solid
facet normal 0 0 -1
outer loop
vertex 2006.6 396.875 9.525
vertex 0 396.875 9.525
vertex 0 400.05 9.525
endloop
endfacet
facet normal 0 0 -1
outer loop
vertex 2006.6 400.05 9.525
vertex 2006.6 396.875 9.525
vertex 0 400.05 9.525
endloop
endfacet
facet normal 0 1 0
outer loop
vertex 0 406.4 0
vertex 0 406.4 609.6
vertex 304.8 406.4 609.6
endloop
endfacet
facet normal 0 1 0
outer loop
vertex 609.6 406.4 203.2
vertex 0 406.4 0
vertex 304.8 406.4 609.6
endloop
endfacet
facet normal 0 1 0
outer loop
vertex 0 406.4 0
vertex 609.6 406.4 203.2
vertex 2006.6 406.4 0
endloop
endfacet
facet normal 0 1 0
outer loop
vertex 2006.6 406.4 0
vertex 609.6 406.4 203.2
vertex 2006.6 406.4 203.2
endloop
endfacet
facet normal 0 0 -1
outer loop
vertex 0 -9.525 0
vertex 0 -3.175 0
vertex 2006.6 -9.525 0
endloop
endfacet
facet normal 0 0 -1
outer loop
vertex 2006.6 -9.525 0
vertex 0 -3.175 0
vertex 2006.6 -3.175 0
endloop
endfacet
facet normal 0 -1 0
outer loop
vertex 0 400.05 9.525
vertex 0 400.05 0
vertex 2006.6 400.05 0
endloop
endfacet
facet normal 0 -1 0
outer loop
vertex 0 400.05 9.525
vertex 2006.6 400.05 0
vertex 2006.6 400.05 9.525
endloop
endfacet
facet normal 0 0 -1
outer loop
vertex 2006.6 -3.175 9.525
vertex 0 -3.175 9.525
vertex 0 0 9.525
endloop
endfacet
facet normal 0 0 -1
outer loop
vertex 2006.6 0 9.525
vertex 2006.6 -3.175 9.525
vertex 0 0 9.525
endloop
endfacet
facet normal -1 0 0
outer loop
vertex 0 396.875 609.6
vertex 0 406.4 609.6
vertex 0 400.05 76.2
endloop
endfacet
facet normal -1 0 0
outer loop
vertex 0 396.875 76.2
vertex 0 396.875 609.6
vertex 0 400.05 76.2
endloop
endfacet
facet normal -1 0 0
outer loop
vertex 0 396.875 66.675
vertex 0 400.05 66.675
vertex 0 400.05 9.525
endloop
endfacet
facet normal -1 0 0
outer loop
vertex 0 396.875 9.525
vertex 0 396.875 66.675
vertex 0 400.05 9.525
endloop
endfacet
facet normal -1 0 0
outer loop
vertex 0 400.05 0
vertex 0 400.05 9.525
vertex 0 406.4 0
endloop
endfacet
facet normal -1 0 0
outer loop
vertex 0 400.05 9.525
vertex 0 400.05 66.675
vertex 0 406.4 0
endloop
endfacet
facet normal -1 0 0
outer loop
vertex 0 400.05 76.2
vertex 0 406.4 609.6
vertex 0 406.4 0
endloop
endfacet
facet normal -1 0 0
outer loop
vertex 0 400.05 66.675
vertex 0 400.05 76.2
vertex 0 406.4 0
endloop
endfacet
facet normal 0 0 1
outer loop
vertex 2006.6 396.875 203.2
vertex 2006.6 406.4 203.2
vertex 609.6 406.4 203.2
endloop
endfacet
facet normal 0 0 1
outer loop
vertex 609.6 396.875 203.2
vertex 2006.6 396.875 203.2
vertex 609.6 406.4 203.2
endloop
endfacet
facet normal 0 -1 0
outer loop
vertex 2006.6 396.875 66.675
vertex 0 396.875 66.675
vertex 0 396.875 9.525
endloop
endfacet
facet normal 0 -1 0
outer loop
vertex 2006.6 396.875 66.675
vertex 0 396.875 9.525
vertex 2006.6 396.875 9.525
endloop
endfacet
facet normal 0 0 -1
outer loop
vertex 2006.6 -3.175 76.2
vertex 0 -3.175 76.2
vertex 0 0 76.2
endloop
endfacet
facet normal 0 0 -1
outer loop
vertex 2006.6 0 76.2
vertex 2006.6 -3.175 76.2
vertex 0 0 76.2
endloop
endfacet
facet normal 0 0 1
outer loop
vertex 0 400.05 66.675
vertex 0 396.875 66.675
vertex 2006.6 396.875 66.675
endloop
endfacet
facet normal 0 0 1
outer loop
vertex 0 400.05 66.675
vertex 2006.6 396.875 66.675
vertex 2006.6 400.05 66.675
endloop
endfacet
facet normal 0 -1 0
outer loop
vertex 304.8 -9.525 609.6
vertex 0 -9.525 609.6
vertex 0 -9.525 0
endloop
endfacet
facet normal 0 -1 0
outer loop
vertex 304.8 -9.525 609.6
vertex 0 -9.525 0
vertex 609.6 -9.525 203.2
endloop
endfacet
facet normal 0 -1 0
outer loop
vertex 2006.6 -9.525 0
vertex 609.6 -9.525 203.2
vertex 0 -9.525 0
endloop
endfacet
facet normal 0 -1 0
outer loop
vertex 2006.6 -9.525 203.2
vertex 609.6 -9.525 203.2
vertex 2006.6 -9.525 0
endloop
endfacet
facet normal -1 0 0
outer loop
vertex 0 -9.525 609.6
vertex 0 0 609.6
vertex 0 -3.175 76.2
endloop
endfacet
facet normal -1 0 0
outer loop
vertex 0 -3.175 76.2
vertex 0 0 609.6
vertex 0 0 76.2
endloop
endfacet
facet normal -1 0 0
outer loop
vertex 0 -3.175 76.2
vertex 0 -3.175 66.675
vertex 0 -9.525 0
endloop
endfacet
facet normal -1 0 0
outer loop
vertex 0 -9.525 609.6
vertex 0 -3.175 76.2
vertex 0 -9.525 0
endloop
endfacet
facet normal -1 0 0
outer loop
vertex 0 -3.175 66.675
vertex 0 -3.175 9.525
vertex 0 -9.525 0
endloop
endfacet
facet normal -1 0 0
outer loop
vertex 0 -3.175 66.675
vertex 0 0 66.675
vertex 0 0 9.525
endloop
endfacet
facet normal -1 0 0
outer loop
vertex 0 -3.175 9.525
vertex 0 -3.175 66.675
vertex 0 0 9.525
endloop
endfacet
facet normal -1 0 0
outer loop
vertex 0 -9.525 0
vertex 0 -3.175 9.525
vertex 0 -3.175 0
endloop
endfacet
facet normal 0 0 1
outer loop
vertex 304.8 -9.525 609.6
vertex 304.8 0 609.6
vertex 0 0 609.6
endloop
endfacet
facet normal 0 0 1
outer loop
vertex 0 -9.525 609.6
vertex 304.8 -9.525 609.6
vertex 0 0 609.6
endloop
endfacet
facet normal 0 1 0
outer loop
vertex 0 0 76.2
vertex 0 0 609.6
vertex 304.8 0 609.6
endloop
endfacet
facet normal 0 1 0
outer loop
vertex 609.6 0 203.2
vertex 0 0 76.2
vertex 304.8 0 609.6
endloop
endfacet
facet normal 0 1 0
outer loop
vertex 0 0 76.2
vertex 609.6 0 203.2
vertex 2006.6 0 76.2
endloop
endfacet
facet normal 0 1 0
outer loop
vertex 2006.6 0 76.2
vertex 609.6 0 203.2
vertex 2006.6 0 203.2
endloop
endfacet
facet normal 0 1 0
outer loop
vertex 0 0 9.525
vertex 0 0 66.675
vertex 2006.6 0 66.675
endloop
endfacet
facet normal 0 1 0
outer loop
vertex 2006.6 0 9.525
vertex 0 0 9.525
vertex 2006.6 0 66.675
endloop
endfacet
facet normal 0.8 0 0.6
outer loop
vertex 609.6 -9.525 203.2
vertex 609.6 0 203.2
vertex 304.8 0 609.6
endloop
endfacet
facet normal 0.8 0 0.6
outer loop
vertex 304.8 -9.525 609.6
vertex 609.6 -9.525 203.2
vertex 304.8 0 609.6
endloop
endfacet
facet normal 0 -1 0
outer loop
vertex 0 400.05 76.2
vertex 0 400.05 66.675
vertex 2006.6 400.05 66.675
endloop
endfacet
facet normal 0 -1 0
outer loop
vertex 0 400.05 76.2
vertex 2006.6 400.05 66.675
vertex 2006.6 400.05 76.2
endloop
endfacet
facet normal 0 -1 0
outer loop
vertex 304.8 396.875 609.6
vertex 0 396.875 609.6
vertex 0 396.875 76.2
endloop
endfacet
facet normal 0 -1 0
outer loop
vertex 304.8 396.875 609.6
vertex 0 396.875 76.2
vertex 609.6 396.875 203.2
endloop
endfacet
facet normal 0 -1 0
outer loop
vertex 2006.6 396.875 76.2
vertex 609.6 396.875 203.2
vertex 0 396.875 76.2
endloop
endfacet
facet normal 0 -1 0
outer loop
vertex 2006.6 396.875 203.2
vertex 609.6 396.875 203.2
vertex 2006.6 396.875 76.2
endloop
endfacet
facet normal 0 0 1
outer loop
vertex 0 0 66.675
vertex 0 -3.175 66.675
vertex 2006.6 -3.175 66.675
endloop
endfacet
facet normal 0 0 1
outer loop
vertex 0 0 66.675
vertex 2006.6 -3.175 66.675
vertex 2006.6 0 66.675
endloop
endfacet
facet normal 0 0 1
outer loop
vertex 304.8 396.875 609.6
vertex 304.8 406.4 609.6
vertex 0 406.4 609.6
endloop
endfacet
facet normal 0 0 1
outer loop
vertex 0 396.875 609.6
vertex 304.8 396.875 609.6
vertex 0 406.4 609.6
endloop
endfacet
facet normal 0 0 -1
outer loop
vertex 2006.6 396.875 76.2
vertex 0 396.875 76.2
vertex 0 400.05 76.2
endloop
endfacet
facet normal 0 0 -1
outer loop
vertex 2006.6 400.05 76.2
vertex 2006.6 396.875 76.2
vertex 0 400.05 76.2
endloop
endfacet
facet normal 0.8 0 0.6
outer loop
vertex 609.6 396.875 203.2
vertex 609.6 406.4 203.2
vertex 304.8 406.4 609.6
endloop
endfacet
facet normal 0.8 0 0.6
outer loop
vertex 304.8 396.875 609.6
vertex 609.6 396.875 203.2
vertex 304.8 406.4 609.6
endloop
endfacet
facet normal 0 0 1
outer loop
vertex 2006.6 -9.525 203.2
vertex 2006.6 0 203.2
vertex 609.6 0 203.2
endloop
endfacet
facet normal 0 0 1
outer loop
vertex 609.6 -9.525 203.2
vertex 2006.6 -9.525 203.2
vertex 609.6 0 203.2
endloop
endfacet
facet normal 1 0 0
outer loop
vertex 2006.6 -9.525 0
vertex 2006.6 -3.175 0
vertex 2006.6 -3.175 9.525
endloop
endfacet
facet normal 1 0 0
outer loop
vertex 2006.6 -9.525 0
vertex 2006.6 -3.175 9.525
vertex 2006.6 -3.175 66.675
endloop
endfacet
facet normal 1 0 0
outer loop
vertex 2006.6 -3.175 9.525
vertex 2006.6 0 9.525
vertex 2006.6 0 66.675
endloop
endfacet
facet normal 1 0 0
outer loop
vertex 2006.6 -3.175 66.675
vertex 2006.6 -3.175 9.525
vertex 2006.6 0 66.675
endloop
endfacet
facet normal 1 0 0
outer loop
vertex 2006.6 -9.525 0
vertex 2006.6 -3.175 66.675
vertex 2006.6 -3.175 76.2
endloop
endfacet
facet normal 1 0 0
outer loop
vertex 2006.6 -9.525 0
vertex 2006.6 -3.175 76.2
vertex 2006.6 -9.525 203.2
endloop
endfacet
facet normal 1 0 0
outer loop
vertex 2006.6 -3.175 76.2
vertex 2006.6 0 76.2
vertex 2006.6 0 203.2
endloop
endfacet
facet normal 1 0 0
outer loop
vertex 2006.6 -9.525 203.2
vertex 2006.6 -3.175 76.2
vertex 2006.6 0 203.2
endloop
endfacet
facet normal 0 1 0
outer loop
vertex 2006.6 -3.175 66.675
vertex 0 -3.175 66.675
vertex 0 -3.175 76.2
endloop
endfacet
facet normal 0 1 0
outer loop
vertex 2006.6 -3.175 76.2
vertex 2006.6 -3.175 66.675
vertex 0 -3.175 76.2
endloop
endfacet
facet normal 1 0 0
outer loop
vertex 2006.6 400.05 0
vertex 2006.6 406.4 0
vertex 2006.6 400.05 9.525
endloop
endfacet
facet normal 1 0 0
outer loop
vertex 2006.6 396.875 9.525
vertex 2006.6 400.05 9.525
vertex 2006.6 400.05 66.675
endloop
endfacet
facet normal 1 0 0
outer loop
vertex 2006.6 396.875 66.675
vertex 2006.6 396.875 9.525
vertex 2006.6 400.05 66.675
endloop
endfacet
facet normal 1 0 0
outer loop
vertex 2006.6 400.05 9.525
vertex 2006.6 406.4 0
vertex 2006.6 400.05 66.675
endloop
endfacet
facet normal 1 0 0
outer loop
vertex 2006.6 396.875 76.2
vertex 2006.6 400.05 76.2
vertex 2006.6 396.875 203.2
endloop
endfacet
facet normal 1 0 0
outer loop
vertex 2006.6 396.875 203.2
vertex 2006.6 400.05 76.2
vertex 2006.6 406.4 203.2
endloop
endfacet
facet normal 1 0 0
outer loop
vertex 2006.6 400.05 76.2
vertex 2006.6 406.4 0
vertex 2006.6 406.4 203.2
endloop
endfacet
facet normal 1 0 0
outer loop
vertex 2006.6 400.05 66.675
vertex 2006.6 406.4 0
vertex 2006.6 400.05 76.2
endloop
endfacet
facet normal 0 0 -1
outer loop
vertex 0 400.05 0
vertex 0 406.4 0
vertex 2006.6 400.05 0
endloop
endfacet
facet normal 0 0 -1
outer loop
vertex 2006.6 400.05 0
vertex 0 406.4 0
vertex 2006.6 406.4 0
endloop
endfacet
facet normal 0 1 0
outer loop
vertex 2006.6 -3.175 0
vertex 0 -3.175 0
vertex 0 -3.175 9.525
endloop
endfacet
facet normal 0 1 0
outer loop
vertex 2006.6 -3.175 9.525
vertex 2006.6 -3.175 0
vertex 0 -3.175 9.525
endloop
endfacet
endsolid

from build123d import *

# Parameters (mm, degrees)
F1_DEPTH  = 9.525
F2_W      = 3.175
F2_H      = 9.525
F7_DEPTH  = 2006.601
F3_W      = 3.175
F3_H      = 9.525
F8_DEPTH  = 2006.601
F9_W      = 3.175
F9_H      = 9.525
F10_DEPTH = 2006.601
F11_W     = 3.175
F11_H     = 9.525
F12_DEPTH = 2006.601


with BuildPart() as f1:
    # F0 (on Front) → F1 (new body)
    with BuildSketch(Plane.XZ):
        Polygon((0, 609.6), (0, 0), (2006.6, 0), (2006.6, 203.2), (609.6, 203.2), (304.8, 609.6), align=None)
    extrude(amount=F1_DEPTH)


with BuildPart() as f4_1:
    # F4: copy of F1
    add(f1.part.moved(Location((0, 628.15571, 0))))


with BuildPart() as f6_1:
    # F6: copy of F1
    add(f1.part.moved(Location((0, 406.4, 0))))

    # F9 (on Right) → F10 (cut, through all)
    with BuildSketch(Plane.YZ):
        with Locations((398.4625, 4.7625)):
            Rectangle(F9_W, F9_H)
    extrude(amount=F10_DEPTH, mode=Mode.SUBTRACT)

    # F11 (on Right) → F12 (cut, through all)
    with BuildSketch(Plane.YZ):
        with Locations((398.4625, 71.4375)):
            Rectangle(F11_W, F11_H)
    extrude(amount=F12_DEPTH, mode=Mode.SUBTRACT)


with BuildPart() as f1_1:
    add(f1.part)

    # F2 (on Right) → F7 (cut, through all)
    with BuildSketch(Plane.YZ):
        with Locations((-1.5875, 4.7625)):
            Rectangle(F2_W, F2_H)
    extrude(amount=F7_DEPTH, mode=Mode.SUBTRACT)

    # F3 (on Right) → F8 (cut, through all)
    with BuildSketch(Plane.YZ):
        with Locations((-1.5875, 71.4375)):
            Rectangle(F3_W, F3_H)
    extrude(amount=F8_DEPTH, mode=Mode.SUBTRACT)


solid = Compound([f6_1.part, f1_1.part])
